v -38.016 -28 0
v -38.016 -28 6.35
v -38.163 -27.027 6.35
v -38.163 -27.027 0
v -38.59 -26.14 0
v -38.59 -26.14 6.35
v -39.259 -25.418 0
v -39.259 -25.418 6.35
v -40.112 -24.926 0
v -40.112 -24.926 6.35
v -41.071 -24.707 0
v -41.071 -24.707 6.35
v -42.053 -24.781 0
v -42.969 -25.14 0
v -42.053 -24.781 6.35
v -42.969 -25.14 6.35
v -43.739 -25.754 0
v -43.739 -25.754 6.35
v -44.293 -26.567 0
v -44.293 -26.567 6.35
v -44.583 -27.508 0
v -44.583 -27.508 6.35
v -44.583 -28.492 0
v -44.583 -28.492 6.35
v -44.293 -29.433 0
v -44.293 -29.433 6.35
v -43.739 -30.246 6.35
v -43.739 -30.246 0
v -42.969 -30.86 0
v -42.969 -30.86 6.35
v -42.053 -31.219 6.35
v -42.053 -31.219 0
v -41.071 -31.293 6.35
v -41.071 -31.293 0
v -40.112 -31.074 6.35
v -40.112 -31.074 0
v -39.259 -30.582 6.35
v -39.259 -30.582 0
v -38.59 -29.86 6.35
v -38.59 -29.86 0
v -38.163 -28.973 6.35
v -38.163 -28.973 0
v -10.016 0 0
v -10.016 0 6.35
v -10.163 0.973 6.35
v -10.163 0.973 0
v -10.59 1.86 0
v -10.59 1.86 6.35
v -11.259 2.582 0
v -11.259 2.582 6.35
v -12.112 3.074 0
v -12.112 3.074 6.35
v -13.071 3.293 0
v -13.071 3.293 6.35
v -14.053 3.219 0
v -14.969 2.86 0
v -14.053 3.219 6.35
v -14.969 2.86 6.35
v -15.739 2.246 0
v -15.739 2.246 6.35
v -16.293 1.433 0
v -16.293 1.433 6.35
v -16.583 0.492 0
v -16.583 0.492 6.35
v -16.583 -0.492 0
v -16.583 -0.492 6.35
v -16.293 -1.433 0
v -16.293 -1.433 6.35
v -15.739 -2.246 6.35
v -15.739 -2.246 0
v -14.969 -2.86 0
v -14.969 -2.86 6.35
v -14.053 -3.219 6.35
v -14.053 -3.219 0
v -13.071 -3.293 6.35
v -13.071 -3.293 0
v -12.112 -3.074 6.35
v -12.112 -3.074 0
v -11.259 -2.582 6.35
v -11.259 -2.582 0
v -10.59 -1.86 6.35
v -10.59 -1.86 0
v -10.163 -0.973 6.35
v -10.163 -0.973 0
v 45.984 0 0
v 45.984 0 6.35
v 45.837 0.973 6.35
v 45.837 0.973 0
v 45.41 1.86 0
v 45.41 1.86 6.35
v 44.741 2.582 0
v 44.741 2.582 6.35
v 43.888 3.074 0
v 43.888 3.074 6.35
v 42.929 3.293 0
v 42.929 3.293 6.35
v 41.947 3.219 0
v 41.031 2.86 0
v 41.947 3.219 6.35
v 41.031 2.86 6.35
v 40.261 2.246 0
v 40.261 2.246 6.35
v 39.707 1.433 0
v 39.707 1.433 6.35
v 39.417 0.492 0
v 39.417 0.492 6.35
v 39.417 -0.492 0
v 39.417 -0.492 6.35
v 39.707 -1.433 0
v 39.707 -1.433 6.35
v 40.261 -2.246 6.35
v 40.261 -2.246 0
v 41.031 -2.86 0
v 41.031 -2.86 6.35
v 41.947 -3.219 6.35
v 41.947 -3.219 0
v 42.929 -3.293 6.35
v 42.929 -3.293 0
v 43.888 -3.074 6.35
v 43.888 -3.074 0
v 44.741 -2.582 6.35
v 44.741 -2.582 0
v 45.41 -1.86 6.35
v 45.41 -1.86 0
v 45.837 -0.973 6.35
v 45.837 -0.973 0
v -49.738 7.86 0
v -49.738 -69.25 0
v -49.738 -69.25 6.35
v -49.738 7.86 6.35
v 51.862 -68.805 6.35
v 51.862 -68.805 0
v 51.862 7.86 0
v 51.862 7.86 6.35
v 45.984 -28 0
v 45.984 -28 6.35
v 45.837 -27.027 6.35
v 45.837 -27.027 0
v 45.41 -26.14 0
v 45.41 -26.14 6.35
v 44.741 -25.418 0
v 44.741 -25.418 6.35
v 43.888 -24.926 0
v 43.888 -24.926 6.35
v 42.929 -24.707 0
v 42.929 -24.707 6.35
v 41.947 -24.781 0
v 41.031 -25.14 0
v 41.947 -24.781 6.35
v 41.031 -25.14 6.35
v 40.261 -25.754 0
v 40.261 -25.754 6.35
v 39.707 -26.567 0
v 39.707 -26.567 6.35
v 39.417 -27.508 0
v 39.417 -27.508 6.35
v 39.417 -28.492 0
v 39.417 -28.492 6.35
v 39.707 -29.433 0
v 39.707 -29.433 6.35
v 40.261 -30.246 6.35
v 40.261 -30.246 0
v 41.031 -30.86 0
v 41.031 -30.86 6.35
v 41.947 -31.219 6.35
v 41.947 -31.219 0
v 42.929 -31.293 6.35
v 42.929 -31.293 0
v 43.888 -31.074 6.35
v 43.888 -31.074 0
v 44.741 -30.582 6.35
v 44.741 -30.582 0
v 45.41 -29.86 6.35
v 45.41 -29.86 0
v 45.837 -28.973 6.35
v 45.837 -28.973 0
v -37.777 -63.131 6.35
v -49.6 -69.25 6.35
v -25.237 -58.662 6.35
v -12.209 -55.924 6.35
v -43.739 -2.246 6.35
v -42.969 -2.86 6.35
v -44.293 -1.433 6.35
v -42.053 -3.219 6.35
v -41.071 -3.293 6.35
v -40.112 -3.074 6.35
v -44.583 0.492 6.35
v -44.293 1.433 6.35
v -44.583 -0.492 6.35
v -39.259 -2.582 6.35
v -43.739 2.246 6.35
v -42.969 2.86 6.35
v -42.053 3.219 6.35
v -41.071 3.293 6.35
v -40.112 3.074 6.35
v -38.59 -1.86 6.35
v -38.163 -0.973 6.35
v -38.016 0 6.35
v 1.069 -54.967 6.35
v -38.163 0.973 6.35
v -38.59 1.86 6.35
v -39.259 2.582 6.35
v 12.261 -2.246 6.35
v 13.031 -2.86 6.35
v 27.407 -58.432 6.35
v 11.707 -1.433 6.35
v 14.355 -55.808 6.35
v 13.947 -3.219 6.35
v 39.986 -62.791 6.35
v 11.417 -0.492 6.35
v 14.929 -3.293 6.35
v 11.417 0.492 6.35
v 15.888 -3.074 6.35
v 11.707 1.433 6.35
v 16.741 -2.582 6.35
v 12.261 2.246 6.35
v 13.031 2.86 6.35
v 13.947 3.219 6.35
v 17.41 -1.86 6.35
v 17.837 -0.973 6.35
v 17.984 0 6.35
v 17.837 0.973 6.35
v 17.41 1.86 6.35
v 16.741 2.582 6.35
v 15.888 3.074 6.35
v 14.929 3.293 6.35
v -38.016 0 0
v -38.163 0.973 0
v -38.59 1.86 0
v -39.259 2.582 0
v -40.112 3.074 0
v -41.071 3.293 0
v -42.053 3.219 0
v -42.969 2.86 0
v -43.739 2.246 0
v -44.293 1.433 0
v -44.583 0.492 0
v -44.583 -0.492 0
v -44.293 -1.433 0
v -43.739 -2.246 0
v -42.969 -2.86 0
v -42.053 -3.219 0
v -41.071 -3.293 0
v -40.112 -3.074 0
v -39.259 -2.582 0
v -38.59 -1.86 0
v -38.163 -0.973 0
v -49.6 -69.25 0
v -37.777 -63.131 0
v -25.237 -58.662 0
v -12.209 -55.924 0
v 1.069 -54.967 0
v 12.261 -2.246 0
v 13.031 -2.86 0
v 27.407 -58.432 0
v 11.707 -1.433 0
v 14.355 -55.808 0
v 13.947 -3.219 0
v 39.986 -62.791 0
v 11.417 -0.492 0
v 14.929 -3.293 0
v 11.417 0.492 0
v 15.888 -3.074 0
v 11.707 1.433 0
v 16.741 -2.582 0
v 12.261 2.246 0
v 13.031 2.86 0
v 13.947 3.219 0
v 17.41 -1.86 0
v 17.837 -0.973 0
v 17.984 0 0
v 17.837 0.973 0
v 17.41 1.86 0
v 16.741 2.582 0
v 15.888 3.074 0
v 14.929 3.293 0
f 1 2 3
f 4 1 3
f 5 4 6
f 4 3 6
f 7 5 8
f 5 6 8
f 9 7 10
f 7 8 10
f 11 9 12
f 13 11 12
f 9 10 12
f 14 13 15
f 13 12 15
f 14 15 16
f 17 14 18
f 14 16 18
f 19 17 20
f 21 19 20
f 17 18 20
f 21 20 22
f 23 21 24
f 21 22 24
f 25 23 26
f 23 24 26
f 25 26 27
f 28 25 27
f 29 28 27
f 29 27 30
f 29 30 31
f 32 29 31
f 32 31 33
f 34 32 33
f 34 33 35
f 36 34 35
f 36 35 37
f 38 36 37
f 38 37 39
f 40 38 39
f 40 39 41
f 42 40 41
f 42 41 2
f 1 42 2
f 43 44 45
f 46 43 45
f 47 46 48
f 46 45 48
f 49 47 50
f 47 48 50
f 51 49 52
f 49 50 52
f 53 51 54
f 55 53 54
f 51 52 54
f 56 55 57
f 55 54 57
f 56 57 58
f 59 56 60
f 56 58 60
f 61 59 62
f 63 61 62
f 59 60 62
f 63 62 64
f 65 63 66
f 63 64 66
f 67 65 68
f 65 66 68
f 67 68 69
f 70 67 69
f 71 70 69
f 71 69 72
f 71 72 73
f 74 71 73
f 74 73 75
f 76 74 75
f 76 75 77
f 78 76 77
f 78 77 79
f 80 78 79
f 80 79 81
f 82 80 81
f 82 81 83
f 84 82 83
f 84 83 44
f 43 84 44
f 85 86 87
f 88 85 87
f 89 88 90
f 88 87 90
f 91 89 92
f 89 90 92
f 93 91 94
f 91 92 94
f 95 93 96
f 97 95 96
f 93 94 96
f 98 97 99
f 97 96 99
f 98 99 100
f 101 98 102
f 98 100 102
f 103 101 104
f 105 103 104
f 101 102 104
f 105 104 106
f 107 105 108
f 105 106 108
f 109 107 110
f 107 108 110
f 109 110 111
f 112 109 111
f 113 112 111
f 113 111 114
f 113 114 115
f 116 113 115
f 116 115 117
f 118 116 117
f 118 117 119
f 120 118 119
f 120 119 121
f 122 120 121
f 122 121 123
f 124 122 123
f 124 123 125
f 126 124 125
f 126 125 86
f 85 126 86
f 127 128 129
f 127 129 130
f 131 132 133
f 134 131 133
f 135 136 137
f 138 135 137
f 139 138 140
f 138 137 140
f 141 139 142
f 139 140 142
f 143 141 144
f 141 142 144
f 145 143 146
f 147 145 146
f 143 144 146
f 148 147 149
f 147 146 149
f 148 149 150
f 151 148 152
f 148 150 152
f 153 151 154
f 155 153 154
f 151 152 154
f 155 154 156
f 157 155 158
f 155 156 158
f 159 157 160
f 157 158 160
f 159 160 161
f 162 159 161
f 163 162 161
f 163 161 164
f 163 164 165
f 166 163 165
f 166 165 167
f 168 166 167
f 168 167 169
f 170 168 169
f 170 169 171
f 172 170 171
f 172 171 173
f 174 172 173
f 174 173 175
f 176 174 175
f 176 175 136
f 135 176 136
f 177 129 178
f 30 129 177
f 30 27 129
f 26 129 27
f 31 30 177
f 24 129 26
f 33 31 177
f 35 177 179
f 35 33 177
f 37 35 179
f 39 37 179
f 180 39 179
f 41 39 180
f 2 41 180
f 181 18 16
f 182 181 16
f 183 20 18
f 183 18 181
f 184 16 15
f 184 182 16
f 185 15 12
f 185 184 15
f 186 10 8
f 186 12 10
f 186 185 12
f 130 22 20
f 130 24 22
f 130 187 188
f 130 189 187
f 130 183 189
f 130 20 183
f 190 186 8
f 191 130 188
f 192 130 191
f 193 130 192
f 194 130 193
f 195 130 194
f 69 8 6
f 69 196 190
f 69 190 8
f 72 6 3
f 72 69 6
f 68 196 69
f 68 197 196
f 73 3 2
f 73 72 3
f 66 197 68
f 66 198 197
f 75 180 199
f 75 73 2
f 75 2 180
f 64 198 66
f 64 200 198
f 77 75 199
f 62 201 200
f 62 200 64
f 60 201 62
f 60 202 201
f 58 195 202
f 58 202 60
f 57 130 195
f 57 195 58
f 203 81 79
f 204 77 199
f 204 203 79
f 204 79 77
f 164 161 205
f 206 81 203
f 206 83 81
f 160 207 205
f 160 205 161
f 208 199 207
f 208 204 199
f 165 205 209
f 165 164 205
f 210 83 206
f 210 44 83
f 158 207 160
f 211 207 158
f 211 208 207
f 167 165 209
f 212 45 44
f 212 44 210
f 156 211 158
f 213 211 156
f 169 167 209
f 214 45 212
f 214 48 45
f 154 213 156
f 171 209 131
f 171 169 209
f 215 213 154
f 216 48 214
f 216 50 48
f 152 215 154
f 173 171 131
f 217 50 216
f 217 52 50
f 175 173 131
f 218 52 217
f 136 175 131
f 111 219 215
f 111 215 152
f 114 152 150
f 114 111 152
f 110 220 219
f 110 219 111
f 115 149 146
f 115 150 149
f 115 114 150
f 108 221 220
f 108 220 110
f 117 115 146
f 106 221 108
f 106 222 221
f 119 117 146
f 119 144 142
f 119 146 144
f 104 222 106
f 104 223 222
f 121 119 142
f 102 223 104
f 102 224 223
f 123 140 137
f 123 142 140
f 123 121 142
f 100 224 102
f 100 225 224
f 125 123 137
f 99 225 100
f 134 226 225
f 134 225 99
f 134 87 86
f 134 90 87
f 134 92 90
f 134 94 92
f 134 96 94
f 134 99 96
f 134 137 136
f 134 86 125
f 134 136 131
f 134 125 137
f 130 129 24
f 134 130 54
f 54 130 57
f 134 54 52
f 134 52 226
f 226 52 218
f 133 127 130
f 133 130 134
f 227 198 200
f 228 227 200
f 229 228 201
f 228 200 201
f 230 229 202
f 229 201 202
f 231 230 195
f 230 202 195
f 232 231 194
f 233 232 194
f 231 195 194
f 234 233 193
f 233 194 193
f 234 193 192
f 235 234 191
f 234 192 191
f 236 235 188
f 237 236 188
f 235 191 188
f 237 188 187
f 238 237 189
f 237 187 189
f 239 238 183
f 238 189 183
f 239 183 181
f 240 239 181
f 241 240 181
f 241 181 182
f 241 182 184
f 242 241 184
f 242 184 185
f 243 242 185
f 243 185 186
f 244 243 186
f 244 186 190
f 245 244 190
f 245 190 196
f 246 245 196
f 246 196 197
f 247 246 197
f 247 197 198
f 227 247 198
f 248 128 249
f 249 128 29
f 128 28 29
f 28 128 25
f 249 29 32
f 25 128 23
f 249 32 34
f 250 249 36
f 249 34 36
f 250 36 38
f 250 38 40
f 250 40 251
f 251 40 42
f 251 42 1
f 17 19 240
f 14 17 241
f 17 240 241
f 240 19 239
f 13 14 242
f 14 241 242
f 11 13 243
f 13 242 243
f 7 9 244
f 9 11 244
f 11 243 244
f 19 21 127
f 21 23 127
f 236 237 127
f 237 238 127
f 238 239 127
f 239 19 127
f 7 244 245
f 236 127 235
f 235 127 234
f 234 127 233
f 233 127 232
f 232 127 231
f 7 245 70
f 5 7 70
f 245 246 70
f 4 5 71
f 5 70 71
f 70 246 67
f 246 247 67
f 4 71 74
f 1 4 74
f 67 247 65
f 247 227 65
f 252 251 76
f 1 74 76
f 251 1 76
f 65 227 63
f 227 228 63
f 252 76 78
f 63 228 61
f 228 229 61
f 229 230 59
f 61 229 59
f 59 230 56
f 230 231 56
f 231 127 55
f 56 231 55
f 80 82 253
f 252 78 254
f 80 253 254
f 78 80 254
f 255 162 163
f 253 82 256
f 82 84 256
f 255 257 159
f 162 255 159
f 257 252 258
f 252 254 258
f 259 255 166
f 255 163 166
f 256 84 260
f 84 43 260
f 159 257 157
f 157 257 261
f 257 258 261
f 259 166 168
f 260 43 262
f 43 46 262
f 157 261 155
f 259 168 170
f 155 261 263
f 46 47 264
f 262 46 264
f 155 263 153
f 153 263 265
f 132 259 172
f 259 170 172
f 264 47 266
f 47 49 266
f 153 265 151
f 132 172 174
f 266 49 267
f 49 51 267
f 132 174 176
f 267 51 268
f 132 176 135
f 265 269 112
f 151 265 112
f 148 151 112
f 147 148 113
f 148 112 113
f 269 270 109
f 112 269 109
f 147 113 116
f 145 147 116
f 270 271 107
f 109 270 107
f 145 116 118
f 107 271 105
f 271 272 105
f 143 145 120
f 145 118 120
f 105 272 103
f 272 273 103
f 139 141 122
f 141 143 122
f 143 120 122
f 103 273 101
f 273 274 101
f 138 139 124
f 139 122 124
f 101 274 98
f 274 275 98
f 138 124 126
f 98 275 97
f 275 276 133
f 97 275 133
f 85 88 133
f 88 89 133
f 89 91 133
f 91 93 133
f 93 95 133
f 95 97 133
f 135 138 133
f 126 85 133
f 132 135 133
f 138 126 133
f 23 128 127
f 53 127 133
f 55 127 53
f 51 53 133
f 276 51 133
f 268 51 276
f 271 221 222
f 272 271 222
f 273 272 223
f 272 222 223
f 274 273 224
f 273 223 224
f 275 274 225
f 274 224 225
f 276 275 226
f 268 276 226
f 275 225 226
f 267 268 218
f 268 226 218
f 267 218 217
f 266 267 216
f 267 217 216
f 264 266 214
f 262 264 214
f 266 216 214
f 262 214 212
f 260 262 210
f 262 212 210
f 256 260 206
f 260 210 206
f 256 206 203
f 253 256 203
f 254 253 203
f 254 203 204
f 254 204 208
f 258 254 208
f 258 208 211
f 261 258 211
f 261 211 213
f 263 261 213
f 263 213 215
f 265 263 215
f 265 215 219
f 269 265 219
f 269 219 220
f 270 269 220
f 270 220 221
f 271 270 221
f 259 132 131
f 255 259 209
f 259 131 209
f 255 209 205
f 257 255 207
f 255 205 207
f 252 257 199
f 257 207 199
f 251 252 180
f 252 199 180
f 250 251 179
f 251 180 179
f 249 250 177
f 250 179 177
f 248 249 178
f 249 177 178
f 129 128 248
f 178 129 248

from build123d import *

# Parameters (mm, degrees)
SKETCH1_W           = 101.6
SKETCH1_H           = 77.11
BOSS_EXTRUDE1_DEPTH = 6.35
SKETCH2_R           = 98.5502
CUT_EXTRUDE1_DEPTH  = 7.35
SKETCH3_R           = 3.302
CUT_EXTRUDE2_DEPTH  = 7.35


with BuildPart() as part:
    # Sketch1 → Boss-Extrude1 (new body)
    with BuildSketch(Plane.XY):
        with Locations((1.062427377, -30.694895509)):
            Rectangle(SKETCH1_W, SKETCH1_H)
    extrude(amount=BOSS_EXTRUDE1_DEPTH)

    # Sketch2 → Cut-Extrude1 (cut, through all)
    with BuildSketch(Plane.XY.offset(6.35)):
        with Locations((1.501142757, -153.515944306)):
            Circle(SKETCH2_R)
    extrude(amount=-CUT_EXTRUDE1_DEPTH, mode=Mode.SUBTRACT)

    # Sketch3 → Cut-Extrude2 (cut, through all)
    with BuildSketch(Plane.XY.offset(6.35)):
        with Locations((-41.318062251, 0)):
            Circle(SKETCH3_R)
        with Locations((-13.318062251, 0)):
            Circle(SKETCH3_R)
        with Locations((14.681937749, 0)):
            Circle(SKETCH3_R)
        with Locations((42.681937749, 0)):
            Circle(SKETCH3_R)
        with Locations((-41.318062251, -28)):
            Circle(SKETCH3_R)
        with Locations((42.681937749, -28)):
            Circle(SKETCH3_R)
    extrude(amount=-CUT_EXTRUDE2_DEPTH, mode=Mode.SUBTRACT)


solid = part.part
